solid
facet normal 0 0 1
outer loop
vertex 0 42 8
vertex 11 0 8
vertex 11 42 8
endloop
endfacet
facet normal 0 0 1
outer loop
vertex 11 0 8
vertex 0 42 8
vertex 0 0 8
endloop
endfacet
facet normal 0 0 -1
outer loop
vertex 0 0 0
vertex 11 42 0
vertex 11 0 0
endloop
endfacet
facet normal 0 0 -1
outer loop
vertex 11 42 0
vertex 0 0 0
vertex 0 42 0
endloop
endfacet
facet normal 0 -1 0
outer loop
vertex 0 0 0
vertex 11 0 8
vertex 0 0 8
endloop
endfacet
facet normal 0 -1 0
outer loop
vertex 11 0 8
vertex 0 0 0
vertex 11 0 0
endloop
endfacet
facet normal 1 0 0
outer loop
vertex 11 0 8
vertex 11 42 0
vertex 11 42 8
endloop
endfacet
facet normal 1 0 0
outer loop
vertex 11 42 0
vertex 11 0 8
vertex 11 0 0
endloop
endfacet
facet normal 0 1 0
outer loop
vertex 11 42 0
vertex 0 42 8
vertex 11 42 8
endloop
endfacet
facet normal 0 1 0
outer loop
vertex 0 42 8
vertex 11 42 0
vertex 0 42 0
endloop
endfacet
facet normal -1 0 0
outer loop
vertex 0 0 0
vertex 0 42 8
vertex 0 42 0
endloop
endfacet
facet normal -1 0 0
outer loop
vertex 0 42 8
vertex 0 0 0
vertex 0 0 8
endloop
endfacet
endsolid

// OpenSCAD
cubeWithDimensions();

module cubeWithDimensions()
{
    list = computations(5, 6, 7);

    x = list[0];
    y = list[1];
    z = list[2];

    cube([x, y, z]);
}

function computations(a, b, c) = [a+b, b*c, c+1];
